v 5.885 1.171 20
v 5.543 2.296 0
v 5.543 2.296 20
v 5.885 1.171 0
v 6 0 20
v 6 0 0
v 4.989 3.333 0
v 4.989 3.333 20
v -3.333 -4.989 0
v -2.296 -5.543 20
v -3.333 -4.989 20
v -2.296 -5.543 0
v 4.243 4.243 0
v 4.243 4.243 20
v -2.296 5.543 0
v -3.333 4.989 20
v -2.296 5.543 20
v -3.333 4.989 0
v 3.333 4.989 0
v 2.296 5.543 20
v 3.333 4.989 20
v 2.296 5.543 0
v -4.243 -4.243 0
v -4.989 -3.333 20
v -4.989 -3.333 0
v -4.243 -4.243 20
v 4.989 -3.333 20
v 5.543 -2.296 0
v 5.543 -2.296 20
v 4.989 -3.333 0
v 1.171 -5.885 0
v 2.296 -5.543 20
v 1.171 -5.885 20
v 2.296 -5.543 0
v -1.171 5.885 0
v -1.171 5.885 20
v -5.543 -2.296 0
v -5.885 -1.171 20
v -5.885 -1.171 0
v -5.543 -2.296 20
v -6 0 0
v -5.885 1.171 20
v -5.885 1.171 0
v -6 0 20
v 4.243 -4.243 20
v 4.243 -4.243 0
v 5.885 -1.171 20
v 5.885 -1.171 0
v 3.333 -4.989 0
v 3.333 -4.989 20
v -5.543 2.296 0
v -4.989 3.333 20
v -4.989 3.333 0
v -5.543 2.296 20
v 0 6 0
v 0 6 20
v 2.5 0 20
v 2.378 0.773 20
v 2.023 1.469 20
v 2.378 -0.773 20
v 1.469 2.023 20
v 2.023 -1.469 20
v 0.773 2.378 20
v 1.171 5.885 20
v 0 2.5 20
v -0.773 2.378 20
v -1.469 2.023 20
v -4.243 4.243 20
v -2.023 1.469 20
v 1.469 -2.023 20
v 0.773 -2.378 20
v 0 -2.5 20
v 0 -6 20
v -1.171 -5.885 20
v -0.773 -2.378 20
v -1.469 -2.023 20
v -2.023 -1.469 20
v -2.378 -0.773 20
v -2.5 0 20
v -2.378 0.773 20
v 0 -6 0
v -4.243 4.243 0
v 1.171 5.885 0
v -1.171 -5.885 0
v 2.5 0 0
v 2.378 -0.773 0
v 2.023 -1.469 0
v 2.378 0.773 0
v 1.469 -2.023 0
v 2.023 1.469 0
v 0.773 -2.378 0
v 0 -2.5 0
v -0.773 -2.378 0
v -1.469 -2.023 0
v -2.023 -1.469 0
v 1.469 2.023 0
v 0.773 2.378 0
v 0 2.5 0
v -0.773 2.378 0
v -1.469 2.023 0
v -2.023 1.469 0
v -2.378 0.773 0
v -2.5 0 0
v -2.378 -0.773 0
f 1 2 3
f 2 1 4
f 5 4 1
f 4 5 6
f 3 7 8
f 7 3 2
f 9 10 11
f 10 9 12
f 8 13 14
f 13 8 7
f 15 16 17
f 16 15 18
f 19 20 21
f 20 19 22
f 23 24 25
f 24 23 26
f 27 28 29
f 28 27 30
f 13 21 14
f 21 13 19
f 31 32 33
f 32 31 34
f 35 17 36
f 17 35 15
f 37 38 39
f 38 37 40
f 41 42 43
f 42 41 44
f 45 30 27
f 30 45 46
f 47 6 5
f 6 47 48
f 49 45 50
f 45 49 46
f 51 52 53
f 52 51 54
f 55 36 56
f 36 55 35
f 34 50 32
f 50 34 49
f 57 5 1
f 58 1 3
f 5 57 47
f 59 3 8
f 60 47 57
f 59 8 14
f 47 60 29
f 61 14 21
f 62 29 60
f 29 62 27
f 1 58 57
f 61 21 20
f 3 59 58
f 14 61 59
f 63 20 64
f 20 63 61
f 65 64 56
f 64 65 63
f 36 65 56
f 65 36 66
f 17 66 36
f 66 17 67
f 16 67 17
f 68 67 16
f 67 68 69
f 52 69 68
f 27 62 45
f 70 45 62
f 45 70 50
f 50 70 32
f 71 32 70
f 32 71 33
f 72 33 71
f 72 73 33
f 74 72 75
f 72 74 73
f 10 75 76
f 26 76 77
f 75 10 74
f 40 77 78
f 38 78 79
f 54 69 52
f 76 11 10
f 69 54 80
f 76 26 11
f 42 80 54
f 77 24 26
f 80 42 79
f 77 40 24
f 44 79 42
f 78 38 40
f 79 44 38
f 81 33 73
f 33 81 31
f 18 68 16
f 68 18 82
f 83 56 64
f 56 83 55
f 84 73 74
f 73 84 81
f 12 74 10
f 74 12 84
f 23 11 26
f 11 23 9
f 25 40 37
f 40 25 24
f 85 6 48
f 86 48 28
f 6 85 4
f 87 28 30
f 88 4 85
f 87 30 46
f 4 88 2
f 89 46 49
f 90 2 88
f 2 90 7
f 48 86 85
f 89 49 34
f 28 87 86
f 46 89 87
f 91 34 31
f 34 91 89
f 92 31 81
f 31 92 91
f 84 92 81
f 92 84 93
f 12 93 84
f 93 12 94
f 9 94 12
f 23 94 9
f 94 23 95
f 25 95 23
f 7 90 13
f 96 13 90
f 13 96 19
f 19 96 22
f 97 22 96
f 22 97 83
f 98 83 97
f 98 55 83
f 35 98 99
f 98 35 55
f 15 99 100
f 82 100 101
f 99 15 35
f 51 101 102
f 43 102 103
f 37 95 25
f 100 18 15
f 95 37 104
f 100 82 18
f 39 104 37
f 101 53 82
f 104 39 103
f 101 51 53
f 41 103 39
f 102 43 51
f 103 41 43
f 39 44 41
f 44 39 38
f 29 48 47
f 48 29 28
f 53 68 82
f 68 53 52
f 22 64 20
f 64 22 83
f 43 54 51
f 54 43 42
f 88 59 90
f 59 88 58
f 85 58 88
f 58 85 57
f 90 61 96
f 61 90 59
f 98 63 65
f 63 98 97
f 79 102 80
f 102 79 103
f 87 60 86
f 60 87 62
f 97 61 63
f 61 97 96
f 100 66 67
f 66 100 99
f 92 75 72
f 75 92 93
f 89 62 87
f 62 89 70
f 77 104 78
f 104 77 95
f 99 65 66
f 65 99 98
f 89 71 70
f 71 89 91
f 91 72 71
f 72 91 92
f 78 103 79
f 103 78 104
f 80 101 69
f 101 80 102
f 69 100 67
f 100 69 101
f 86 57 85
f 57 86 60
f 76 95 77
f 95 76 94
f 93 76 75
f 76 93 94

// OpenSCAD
module axle(){
  difference(){ cylinder(h=20,r=6,$fn=32); translate([0,0,-0.1]) cylinder(h=20.2,r=2.5,$fn=20); }
}
axle();
